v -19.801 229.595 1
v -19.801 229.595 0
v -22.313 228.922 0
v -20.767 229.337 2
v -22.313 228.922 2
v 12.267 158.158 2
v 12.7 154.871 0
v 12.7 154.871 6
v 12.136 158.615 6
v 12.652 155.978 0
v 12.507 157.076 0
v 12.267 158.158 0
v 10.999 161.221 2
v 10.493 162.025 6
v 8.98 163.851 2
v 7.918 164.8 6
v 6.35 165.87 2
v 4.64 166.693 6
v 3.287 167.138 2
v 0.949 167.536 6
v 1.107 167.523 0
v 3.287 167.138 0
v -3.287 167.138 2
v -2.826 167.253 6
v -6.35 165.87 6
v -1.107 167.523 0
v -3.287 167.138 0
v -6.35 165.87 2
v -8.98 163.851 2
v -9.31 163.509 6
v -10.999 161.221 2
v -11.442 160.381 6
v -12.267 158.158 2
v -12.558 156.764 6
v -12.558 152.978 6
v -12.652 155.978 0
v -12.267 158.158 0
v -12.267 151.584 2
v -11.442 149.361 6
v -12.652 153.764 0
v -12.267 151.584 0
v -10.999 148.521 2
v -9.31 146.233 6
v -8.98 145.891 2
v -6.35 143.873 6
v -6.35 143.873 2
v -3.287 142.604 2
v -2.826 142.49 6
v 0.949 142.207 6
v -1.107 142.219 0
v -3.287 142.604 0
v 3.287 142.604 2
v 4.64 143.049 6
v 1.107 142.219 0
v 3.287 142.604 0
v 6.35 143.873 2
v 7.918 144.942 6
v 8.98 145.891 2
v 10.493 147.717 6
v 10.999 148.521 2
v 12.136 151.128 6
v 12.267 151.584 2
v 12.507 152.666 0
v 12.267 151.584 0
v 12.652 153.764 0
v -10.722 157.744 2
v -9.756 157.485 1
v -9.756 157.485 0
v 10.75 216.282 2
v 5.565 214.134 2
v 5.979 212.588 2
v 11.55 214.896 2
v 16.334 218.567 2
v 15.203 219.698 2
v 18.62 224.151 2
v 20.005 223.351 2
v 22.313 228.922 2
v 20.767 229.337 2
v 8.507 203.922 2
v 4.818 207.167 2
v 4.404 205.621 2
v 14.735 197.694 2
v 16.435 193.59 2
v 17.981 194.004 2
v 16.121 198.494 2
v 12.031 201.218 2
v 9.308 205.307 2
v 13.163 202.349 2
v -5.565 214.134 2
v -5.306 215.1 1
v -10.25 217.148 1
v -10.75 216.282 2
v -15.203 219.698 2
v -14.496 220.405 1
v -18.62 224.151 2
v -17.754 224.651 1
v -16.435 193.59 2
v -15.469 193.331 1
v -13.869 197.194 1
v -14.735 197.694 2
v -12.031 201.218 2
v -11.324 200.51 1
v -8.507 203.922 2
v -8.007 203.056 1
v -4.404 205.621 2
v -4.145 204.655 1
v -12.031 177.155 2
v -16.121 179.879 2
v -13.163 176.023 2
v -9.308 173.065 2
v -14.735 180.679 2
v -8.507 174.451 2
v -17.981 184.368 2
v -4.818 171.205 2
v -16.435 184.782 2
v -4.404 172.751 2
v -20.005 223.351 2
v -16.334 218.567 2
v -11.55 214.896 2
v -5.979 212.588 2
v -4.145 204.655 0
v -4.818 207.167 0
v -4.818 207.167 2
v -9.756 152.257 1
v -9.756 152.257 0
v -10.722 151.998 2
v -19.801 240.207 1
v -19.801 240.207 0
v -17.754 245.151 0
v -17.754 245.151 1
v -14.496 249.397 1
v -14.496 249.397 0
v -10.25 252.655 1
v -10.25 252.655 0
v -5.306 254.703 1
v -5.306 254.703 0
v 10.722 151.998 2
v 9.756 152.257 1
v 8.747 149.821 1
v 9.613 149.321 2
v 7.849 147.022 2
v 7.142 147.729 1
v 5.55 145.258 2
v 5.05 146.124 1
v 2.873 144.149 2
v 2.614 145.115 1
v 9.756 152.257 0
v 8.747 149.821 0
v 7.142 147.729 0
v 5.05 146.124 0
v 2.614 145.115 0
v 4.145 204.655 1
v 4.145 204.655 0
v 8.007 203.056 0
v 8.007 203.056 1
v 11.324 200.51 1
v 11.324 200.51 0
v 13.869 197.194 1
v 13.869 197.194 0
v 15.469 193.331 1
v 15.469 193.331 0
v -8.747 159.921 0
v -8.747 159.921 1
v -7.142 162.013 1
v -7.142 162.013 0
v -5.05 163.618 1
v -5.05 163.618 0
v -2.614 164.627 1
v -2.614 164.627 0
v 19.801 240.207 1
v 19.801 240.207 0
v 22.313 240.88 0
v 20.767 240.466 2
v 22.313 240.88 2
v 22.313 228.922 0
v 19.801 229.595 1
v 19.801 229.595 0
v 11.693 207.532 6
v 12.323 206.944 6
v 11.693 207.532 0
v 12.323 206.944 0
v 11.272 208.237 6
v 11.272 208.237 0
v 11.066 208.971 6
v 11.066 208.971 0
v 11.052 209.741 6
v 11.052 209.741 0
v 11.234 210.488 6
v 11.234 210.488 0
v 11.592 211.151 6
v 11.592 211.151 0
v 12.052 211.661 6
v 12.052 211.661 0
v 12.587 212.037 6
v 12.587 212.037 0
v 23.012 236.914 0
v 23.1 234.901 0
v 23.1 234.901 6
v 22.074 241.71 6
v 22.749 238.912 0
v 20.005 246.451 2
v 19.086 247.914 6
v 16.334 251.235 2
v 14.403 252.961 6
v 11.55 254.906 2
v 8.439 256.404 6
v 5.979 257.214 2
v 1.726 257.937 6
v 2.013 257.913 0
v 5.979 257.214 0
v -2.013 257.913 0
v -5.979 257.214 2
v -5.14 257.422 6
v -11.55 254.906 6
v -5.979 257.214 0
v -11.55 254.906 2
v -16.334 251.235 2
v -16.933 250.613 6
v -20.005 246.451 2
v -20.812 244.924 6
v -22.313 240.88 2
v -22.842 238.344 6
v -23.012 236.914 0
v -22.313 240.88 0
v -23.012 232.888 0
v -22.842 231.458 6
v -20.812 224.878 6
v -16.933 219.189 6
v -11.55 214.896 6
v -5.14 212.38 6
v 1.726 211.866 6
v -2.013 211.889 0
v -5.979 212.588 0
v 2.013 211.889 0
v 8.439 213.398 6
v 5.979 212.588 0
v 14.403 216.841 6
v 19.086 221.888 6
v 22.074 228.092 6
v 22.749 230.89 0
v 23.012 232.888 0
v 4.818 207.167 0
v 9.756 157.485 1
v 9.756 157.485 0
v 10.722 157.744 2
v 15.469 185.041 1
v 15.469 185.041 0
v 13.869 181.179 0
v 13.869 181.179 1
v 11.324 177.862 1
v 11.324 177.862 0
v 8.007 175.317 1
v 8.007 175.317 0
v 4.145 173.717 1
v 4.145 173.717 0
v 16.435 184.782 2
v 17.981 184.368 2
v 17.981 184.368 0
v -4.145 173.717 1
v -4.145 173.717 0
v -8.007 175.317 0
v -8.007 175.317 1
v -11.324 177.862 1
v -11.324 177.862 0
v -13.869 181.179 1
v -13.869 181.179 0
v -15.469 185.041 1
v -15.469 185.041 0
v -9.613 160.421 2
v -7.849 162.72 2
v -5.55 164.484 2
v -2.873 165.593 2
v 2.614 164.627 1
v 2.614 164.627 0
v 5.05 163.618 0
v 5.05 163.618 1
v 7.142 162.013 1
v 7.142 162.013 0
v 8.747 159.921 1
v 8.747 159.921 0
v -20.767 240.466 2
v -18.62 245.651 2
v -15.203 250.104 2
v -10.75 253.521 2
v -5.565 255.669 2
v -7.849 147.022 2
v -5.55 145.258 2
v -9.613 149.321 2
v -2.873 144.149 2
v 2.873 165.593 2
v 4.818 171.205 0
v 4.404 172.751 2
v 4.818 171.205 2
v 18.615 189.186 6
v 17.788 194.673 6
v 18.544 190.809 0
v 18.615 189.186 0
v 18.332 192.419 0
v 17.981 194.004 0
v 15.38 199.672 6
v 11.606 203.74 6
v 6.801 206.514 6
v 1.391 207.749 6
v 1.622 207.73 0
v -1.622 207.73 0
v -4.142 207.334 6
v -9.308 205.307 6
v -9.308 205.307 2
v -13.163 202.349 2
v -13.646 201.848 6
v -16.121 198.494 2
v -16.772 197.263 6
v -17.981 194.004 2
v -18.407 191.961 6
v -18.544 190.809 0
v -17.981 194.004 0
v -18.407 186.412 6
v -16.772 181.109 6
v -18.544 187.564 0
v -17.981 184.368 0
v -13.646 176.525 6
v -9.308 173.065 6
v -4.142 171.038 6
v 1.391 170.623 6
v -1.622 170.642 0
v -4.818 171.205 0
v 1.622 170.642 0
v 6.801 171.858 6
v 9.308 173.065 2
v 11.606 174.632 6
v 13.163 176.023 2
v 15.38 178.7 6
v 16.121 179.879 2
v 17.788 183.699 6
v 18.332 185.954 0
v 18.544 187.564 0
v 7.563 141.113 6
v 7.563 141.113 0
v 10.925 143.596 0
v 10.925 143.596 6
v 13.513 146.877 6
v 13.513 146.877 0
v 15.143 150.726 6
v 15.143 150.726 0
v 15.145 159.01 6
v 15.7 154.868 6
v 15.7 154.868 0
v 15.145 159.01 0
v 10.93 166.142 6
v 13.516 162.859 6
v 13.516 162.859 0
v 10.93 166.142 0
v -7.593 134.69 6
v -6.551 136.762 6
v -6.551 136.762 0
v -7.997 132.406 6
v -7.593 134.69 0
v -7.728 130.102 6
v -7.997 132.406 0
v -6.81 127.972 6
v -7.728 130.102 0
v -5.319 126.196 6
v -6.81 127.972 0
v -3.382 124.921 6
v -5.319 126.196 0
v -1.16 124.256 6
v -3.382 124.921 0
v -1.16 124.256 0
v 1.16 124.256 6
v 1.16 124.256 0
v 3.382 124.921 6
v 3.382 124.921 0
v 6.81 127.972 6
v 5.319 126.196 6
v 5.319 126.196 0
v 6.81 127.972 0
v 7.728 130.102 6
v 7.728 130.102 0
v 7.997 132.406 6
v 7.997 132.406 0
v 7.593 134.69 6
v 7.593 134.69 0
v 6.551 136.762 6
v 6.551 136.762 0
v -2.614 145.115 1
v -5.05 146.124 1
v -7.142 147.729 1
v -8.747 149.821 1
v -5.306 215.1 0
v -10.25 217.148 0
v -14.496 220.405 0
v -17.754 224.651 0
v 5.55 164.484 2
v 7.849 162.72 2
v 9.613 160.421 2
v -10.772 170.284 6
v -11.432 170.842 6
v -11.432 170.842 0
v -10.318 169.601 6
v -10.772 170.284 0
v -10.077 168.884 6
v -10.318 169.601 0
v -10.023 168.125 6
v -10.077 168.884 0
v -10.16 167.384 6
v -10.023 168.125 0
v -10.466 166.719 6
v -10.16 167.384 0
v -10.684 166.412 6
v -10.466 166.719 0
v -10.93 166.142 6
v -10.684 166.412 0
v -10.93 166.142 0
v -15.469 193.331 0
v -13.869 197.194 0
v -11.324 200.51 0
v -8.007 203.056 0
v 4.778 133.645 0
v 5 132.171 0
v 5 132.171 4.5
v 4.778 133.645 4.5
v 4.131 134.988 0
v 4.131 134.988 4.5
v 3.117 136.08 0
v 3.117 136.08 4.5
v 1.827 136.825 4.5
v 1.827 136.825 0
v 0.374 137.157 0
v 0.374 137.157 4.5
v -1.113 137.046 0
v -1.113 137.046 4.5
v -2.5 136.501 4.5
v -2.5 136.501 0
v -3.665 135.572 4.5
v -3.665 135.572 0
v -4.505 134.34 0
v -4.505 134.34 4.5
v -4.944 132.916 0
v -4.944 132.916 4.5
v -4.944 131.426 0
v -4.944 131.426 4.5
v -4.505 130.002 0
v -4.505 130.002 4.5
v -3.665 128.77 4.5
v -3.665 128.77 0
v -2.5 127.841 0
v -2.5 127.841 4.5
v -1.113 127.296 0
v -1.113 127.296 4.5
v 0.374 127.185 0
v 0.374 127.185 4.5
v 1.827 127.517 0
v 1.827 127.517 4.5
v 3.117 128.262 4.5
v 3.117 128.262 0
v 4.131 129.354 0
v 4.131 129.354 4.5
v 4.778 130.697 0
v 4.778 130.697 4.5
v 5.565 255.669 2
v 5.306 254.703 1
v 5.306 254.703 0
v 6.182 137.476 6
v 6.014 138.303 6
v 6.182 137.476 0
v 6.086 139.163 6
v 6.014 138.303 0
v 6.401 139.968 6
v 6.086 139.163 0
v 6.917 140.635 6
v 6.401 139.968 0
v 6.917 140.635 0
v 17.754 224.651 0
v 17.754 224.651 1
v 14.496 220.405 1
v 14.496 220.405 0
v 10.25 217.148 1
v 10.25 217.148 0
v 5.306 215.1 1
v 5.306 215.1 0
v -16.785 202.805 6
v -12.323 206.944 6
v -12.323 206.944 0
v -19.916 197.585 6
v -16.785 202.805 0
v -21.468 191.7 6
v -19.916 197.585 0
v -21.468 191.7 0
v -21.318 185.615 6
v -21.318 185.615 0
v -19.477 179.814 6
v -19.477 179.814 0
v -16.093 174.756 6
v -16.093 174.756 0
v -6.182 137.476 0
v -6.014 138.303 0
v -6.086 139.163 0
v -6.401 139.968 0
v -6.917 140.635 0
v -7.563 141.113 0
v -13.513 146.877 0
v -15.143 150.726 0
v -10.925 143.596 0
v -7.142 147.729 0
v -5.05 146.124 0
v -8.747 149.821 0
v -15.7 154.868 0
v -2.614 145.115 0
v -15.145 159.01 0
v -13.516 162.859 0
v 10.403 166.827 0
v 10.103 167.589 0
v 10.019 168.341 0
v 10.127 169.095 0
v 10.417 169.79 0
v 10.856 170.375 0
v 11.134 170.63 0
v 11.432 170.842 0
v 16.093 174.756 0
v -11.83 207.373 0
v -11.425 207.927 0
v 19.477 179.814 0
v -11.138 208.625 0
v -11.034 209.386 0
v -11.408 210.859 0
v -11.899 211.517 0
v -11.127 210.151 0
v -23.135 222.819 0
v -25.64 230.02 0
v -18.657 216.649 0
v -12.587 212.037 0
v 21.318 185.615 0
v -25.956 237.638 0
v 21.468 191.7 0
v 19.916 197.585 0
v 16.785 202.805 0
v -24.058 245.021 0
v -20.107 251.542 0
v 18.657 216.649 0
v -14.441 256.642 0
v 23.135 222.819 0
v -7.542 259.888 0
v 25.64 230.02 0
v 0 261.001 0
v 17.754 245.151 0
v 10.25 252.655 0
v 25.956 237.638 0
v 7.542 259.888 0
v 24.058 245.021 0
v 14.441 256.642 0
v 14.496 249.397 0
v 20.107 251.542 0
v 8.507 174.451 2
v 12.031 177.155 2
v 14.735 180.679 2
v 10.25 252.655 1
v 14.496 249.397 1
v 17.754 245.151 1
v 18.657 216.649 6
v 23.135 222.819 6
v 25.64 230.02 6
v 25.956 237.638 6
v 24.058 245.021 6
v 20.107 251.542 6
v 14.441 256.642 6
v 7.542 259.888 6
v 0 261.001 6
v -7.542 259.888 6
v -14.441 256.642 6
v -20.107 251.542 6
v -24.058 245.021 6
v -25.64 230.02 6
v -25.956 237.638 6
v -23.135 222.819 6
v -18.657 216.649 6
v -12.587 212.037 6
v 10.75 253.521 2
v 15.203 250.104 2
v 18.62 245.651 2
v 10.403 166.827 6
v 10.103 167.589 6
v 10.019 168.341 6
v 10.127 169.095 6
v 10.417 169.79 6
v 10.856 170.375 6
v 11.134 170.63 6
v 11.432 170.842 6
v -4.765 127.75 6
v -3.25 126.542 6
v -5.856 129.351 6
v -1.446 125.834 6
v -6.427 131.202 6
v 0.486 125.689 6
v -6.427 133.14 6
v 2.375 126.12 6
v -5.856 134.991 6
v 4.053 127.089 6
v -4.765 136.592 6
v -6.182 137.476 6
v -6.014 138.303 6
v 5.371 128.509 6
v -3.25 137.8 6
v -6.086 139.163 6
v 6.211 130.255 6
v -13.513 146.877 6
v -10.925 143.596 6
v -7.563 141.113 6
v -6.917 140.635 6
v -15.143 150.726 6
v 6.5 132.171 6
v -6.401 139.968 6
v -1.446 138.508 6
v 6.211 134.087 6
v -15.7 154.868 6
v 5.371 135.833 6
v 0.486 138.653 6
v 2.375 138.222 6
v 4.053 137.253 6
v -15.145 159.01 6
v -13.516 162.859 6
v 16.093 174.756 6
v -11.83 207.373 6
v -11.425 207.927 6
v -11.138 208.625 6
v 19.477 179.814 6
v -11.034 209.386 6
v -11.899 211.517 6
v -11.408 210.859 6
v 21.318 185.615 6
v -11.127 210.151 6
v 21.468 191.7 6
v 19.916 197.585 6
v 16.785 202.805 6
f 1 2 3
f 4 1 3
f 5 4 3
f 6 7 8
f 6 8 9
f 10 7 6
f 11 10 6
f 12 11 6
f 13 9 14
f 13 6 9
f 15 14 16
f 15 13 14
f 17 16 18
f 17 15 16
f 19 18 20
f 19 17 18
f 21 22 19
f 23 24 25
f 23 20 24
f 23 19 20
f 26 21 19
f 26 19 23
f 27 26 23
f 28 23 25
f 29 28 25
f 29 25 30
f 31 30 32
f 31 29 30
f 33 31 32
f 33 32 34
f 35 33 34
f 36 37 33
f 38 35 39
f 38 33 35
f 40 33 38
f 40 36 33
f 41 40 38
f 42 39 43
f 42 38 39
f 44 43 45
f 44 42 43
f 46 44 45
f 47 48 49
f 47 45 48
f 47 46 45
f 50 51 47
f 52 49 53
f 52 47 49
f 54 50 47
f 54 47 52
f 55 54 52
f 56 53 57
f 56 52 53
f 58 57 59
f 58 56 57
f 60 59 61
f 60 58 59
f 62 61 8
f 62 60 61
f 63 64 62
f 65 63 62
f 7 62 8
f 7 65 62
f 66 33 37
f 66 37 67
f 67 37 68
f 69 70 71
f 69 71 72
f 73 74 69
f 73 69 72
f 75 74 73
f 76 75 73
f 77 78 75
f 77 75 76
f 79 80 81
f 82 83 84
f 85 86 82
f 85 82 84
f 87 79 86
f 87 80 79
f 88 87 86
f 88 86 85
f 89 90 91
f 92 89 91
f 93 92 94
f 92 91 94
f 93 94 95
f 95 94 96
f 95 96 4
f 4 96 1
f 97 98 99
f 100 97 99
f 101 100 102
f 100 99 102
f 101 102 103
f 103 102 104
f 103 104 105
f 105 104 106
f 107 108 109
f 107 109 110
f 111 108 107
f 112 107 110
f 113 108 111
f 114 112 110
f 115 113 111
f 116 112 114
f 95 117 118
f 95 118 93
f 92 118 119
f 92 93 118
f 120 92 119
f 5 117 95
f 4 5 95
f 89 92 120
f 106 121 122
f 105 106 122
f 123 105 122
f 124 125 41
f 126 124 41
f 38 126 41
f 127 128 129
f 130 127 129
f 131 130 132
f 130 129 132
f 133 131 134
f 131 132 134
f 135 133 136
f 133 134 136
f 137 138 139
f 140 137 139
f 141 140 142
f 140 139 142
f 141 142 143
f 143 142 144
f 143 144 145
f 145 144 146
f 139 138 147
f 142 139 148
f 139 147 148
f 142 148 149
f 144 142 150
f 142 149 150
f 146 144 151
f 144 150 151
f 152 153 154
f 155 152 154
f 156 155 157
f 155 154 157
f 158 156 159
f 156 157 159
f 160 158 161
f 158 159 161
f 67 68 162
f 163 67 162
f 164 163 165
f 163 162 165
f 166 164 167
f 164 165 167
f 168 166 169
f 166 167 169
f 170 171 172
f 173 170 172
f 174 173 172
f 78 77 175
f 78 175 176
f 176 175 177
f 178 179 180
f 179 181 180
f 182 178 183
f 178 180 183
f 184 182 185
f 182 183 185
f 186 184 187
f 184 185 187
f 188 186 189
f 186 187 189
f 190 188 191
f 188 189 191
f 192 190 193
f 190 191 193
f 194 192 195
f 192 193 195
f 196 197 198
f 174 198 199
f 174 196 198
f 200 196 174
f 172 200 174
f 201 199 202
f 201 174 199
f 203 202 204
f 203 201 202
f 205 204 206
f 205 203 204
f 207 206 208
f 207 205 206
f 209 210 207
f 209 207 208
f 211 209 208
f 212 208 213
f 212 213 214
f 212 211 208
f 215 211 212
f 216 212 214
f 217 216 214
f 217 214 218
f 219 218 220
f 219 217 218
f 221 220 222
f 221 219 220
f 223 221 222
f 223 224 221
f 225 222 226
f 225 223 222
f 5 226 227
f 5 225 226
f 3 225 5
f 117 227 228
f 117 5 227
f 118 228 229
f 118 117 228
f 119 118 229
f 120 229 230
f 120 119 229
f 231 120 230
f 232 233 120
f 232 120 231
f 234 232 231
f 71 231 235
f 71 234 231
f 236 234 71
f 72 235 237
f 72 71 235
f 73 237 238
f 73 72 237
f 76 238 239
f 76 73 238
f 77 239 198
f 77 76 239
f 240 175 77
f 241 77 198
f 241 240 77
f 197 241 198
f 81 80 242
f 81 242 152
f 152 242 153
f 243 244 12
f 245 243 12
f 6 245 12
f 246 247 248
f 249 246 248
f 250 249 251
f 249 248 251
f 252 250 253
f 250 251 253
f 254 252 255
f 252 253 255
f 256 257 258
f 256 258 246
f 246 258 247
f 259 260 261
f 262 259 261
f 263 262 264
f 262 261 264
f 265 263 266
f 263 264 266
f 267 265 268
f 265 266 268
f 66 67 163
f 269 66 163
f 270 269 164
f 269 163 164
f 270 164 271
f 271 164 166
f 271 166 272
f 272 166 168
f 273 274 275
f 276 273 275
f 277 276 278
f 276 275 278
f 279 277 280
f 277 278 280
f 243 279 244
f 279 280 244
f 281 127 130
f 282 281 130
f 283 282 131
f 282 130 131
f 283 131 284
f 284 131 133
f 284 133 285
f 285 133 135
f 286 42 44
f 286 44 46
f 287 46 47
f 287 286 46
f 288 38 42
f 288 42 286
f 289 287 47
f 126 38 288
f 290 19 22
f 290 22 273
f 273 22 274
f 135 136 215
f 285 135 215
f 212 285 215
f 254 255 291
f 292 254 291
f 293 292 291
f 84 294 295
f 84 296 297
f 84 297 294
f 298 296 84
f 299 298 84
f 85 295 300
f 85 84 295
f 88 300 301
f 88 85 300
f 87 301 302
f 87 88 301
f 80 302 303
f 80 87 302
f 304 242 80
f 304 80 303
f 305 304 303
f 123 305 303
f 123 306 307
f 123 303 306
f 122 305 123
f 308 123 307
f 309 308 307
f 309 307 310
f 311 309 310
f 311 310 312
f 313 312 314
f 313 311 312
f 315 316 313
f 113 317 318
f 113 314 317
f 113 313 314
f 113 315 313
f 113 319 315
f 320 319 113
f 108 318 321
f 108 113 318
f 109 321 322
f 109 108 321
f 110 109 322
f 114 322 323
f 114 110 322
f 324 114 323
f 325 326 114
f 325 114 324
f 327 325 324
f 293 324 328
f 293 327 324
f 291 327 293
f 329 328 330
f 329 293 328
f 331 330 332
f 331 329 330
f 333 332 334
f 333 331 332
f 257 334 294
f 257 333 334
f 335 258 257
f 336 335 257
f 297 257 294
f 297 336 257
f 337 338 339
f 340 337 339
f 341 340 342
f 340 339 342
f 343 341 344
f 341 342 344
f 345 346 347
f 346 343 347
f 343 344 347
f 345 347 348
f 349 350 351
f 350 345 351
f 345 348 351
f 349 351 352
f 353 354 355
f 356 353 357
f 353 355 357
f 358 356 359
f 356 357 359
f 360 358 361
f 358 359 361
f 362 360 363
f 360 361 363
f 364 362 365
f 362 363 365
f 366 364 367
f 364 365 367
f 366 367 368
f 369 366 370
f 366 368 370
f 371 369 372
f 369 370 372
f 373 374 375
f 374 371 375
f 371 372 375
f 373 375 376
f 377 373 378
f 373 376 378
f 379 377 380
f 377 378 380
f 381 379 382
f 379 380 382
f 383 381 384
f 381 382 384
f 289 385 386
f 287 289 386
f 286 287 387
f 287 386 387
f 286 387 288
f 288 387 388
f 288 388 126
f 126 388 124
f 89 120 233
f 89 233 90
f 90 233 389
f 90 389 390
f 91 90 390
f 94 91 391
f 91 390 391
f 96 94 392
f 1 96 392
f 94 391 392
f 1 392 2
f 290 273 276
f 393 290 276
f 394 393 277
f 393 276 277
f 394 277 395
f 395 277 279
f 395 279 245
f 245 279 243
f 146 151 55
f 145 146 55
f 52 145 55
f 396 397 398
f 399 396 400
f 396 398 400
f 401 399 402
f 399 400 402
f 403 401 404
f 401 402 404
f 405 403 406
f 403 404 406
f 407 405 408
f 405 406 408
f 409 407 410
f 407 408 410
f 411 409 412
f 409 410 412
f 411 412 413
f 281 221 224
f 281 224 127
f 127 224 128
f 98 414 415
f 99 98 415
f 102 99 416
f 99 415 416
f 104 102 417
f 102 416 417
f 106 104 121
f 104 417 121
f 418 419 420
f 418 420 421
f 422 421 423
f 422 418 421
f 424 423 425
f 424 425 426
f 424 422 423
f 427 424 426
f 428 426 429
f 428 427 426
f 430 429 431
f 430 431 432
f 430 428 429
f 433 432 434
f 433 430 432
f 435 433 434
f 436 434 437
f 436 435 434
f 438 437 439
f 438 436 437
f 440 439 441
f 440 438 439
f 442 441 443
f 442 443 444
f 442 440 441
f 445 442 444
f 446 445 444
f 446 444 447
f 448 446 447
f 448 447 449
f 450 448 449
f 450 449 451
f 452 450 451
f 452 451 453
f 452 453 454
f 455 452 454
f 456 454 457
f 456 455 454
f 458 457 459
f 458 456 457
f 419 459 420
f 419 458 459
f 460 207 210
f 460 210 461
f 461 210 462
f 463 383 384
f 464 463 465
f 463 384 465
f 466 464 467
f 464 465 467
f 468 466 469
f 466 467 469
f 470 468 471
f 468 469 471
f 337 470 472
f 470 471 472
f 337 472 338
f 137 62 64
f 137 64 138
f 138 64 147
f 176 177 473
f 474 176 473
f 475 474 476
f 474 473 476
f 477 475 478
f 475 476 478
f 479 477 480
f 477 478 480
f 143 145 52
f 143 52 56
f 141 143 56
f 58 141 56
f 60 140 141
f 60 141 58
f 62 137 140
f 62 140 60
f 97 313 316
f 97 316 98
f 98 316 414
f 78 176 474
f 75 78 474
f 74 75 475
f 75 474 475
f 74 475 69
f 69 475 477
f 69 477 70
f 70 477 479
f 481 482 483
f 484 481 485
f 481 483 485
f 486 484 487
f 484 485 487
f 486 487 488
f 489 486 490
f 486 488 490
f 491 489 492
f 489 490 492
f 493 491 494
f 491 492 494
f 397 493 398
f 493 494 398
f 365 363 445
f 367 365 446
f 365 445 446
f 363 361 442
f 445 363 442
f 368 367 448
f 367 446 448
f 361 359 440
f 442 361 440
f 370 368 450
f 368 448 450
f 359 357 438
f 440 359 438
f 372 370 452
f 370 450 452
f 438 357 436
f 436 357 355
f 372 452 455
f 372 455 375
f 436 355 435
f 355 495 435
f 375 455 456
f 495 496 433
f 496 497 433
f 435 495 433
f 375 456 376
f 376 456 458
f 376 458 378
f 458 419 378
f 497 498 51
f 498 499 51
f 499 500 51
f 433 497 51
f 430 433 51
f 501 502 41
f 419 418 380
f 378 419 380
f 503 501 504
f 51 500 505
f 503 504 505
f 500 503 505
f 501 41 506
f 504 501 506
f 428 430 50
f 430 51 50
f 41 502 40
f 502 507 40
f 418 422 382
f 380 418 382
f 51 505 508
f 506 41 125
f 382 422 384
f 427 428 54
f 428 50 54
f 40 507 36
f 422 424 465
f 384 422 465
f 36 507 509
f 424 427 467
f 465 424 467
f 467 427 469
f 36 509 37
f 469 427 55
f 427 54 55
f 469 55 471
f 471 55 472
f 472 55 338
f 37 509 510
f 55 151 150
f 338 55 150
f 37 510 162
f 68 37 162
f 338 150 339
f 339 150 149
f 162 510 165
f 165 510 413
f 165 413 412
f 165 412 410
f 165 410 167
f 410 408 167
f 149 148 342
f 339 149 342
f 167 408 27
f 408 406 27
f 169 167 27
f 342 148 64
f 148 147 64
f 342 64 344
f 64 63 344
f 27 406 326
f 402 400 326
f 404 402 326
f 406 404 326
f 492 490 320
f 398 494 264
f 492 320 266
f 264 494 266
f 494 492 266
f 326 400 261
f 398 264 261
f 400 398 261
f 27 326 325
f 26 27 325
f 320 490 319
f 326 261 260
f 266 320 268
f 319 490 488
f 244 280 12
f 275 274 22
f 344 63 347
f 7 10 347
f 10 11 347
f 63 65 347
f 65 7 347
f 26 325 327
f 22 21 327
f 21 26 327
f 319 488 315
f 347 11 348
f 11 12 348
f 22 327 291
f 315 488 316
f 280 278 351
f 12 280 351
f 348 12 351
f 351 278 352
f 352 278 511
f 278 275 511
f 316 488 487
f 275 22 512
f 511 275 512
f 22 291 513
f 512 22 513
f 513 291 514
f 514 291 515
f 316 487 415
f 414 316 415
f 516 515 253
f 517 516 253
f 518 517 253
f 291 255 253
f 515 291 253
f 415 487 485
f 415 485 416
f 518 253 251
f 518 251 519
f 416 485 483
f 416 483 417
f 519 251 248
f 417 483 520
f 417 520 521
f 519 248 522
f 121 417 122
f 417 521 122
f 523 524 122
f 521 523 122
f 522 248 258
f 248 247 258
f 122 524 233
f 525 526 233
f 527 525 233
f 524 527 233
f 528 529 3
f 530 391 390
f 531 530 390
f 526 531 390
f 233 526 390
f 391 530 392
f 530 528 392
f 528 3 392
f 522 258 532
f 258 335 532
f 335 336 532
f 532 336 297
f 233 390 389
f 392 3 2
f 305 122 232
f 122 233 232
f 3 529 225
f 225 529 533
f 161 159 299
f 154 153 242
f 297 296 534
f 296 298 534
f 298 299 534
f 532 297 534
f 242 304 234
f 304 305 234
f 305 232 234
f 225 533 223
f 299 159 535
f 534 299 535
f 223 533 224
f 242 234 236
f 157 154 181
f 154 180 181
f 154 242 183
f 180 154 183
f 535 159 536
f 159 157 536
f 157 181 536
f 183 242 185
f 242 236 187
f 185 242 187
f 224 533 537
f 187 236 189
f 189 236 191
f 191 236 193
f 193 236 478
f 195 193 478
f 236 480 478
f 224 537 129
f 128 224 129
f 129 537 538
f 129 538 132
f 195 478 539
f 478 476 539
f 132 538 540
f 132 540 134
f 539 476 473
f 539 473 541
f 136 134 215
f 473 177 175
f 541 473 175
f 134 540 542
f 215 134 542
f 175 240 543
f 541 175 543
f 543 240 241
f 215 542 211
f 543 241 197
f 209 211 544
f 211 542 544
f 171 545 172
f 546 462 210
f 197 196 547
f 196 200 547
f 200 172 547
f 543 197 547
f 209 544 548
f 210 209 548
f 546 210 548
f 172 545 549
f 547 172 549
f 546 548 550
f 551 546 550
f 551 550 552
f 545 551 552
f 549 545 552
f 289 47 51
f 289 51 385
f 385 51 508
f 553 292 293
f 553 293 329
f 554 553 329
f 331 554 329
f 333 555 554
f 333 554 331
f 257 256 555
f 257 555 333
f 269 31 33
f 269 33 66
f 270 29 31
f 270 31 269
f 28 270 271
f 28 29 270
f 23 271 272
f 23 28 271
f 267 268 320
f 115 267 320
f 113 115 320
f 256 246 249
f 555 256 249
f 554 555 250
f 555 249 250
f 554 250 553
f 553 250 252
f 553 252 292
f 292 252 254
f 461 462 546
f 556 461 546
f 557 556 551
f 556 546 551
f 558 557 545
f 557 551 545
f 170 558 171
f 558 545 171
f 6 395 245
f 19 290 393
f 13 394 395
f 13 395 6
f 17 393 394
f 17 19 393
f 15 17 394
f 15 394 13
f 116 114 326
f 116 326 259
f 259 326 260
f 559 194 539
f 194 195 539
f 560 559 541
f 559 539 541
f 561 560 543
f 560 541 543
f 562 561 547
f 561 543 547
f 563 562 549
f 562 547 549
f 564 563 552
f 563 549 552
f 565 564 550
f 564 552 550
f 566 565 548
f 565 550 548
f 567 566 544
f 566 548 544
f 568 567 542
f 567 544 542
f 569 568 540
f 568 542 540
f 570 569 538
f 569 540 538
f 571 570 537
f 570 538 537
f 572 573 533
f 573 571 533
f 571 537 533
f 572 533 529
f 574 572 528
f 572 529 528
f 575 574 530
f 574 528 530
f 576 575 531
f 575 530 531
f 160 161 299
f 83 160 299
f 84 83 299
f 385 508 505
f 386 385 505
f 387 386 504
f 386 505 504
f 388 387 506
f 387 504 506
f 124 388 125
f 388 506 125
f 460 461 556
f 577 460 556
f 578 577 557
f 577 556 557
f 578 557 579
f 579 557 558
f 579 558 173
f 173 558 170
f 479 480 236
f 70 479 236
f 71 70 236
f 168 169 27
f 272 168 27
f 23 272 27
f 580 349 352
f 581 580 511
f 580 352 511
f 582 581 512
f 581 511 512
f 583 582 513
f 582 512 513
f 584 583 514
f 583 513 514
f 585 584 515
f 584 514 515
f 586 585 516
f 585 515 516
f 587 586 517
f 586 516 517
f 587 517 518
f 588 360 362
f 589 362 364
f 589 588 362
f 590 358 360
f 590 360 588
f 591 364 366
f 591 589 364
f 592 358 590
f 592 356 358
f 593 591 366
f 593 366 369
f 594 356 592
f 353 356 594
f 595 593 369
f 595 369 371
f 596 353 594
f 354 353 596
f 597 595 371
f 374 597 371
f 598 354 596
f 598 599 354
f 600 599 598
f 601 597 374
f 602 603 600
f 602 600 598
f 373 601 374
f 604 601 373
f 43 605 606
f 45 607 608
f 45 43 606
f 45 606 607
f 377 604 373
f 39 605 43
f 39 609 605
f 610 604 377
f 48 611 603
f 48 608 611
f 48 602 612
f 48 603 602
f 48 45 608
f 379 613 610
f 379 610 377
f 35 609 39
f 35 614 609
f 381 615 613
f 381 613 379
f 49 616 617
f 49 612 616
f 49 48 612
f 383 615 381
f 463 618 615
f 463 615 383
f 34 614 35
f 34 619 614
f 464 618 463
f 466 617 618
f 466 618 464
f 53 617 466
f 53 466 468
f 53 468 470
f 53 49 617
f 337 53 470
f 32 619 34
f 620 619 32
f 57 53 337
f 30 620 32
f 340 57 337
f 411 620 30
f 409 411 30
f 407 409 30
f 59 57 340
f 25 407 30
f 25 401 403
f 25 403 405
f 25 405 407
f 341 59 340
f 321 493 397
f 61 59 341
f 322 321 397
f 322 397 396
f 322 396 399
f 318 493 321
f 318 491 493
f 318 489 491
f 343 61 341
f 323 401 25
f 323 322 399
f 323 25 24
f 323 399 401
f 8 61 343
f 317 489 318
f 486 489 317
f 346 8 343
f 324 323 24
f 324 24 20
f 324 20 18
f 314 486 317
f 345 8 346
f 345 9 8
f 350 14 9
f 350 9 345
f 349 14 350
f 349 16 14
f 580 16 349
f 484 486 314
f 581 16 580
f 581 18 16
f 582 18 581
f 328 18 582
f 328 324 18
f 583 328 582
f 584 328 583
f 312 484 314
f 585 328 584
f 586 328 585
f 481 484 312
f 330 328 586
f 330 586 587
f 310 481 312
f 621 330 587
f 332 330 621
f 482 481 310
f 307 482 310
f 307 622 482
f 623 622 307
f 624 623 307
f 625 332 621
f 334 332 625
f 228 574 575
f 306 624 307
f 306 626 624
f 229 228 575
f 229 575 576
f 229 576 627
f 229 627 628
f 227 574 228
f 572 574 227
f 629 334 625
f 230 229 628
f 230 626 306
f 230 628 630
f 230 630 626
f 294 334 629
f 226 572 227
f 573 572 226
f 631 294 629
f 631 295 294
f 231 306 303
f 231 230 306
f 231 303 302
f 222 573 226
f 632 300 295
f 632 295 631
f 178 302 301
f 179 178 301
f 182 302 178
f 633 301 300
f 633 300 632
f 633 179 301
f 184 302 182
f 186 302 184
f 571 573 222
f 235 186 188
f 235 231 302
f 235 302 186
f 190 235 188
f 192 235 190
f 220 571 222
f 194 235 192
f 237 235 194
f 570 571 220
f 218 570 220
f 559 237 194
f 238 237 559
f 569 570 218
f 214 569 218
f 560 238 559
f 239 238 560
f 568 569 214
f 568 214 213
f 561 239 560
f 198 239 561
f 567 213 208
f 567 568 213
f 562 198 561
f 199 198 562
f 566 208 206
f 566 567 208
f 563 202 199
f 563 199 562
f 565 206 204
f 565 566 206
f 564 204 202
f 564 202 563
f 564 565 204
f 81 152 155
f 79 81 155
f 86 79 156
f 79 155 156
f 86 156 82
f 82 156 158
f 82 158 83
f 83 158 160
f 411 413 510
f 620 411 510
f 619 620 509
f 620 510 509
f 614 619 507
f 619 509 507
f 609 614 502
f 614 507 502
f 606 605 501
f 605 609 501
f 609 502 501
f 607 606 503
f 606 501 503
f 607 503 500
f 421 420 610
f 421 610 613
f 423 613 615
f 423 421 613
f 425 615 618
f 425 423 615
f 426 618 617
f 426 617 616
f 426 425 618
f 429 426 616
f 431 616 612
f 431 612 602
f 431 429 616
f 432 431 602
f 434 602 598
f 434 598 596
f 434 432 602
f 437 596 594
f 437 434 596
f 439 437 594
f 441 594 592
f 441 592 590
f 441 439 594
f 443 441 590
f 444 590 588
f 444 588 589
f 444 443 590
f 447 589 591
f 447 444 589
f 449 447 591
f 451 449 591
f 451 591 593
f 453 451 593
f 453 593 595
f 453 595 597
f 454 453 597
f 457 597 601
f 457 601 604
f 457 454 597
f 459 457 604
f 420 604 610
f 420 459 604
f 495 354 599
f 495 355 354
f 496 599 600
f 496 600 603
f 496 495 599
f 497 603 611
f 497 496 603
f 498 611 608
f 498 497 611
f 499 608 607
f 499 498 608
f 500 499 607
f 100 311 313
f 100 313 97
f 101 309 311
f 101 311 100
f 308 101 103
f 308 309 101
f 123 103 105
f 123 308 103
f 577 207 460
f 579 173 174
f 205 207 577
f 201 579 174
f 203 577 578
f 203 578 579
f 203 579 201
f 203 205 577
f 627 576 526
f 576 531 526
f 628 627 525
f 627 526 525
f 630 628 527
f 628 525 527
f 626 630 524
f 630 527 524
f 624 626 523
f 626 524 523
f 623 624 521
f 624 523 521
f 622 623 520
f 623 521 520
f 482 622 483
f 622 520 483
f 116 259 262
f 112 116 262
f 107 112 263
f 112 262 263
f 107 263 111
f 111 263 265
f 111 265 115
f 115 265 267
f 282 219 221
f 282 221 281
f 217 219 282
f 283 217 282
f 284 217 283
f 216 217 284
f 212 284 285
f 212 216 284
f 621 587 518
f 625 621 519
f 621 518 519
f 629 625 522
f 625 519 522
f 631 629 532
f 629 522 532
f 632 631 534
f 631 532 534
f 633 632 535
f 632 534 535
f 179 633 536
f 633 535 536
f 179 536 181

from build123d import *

# Parameters (mm, degrees)
F0_R      = 26.1
F0_R_2    = 23.1
F1_DEPTH  = 6
F3_DEPTH  = 2
F4_SIZE   = 1
F5_R      = 21.615
F5_R_2    = 18.615
F6_DEPTH  = 6
F8_DEPTH  = 2
F9_SIZE   = 1
F10_R     = 15.7
F10_R_2   = 12.7
F11_DEPTH = 6
F13_DEPTH = 2
F14_SIZE  = 1
F15_R     = 8
F15_R_2   = 5
F16_DEPTH = 6
F17_SIZE  = 1.5
F18_R     = 3


with BuildPart() as f1:
    # F0 (on Top) → F1 (new body)
    with BuildSketch(Plane.XY):
        with Locations((0, 234.9011148272)):
            Circle(F0_R)
        with Locations((0, 234.9011148272)):
            Circle(F0_R_2, mode=Mode.SUBTRACT)
    extrude(amount=F1_DEPTH)

    # F2 (on Top) → F3 (join)
    with BuildSketch(Plane.XY):
        with BuildLine():
            ThreePointArc((-19.8014794389, 240.2069052518), (-14.4956890143, 249.3968038415), (-5.3057904246, 254.7025942661))
            Line((-5.3057904246, 254.7025942661), (-5.9787199419, 257.2140014145))
            ThreePointArc((-5.9787199419, 257.2140014145), (-16.3341666454, 251.2352814726), (-22.3128865873, 240.8798347691))
            Line((-22.3128865873, 240.8798347691), (-19.8014794389, 240.2069052518))
        make_face()
        with BuildLine():
            ThreePointArc((5.3057904246, 254.7025942661), (14.4956890143, 249.3968038415), (19.8014794389, 240.2069052518))
            Line((19.8014794389, 240.2069052518), (22.3128865873, 240.8798347691))
            ThreePointArc((22.3128865873, 240.8798347691), (16.3341666454, 251.2352814726), (5.9787199419, 257.2140014145))
            Line((5.9787199419, 257.2140014145), (5.3057904246, 254.7025942661))
        make_face()
        with BuildLine():
            Line((22.3128865873, 228.9223948853), (19.8014794389, 229.5953244026))
            ThreePointArc((19.8014794389, 229.5953244026), (14.4956890143, 220.4054258129), (5.3057904246, 215.0996353883))
            Line((5.3057904246, 215.0996353883), (5.9787199419, 212.5882282399))
            ThreePointArc((5.9787199419, 212.5882282399), (16.3341666454, 218.5669481818), (22.3128865873, 228.9223948853))
        make_face()
        with BuildLine():
            Line((-5.9787199419, 212.5882282399), (-5.3057904246, 215.0996353883))
            ThreePointArc((-5.3057904246, 215.0996353883), (-14.4956890143, 220.4054258129), (-19.8014794389, 229.5953244026))
            Line((-19.8014794389, 229.5953244026), (-22.3128865873, 228.9223948853))
            ThreePointArc((-22.3128865873, 228.9223948853), (-16.3341666454, 218.5669481818), (-5.9787199419, 212.5882282399))
        make_face()
    extrude(amount=F3_DEPTH)

    # F4
    f4_edges = [f1.edges().sort_by_distance(p)[0] for p in [
        (-14.495689, 249.396804, 2),
        (14.495689, 249.396804, 2),
        (14.495689, 220.405426, 2),
        (-14.495689, 220.405426, 2),
    ]]
    chamfer(f4_edges, length=F4_SIZE)

    # F5 (on Top) → F6 (join)
    with BuildSketch(Plane.XY):
        with Locations((0, 189.1861148272)):
            Circle(F5_R)
        with Locations((0, 189.1861148272)):
            Circle(F5_R_2, mode=Mode.SUBTRACT)
    extrude(amount=F6_DEPTH)

    # F7 (on Top) → F8 (join)
    with BuildSketch(Plane.XY):
        with BuildLine():
            ThreePointArc((-15.469302108, 193.3311018345), (-11.3243151007, 200.5104299279), (-4.1449870073, 204.6554169352))
            Line((-4.1449870073, 204.6554169352), (-4.8179165246, 207.1668240836))
            ThreePointArc((-4.8179165246, 207.1668240836), (-13.1627927318, 202.348907559), (-17.9807092564, 194.0040313518))
            Line((-17.9807092564, 194.0040313518), (-15.469302108, 193.3311018345))
        make_face()
        with BuildLine():
            Line((4.8179165246, 207.1668240836), (4.1449870073, 204.6554169352))
            ThreePointArc((4.1449870073, 204.6554169352), (11.3243151007, 200.5104299279), (15.469302108, 193.3311018345))
            Line((15.469302108, 193.3311018345), (17.9807092564, 194.0040313518))
            ThreePointArc((17.9807092564, 194.0040313518), (13.1627927318, 202.348907559), (4.8179165246, 207.1668240836))
        make_face()
        with BuildLine():
            Line((17.9807092564, 184.3681983026), (15.469302108, 185.0411278199))
            ThreePointArc((15.469302108, 185.0411278199), (11.3243151007, 177.8617997265), (4.1449870073, 173.7168127192))
            Line((4.1449870073, 173.7168127192), (4.8179165246, 171.2054055708))
            ThreePointArc((4.8179165246, 171.2054055708), (13.1627927318, 176.0233220954), (17.9807092564, 184.3681983026))
        make_face()
        with BuildLine():
            Line((-4.8179165246, 171.2054055708), (-4.1449870073, 173.7168127192))
            ThreePointArc((-4.1449870073, 173.7168127192), (-11.3243151007, 177.8617997265), (-15.469302108, 185.0411278199))
            Line((-15.469302108, 185.0411278199), (-17.9807092564, 184.3681983026))
            ThreePointArc((-17.9807092564, 184.3681983026), (-13.1627927318, 176.0233220954), (-4.8179165246, 171.2054055708))
        make_face()
    extrude(amount=F8_DEPTH)

    # F9
    f9_edges = [f1.edges().sort_by_distance(p)[0] for p in [
        (-11.324315, 200.51043, 2),
        (11.324315, 200.51043, 2),
        (11.324315, 177.8618, 2),
        (-11.324315, 177.8618, 2),
    ]]
    chamfer(f9_edges, length=F9_SIZE)

    # F10 (on Top) → F11 (join)
    with BuildSketch(Plane.XY):
        with Locations((0, 154.8711148272)):
            Circle(F10_R)
        with Locations((0, 154.8711148272)):
            Circle(F10_R_2, mode=Mode.SUBTRACT)
    extrude(amount=F11_DEPTH)

    # F12 (on Top) → F13 (join)
    with BuildSketch(Plane.XY):
        with BuildLine():
            Line((-2.6140723555, 164.6269656727), (-3.2870018728, 167.1383728211))
            ThreePointArc((-3.2870018728, 167.1383728211), (-8.9802561211, 163.8513709483), (-12.2672579939, 158.1581167))
            Line((-12.2672579939, 158.1581167), (-9.7558508455, 157.4851871827))
            ThreePointArc((-9.7558508455, 157.4851871827), (-7.14177849, 162.0128933172), (-2.6140723555, 164.6269656727))
        make_face()
        with BuildLine():
            Line((3.2870018728, 167.1383728211), (2.6140723555, 164.6269656727))
            ThreePointArc((2.6140723555, 164.6269656727), (7.14177849, 162.0128933172), (9.7558508455, 157.4851871827))
            Line((9.7558508455, 157.4851871827), (12.2672579939, 158.1581167))
            ThreePointArc((12.2672579939, 158.1581167), (8.9802561211, 163.8513709483), (3.2870018728, 167.1383728211))
        make_face()
        with BuildLine():
            Line((12.2672579939, 151.5841129544), (9.7558508455, 152.2570424717))
            ThreePointArc((9.7558508455, 152.2570424717), (7.14177849, 147.7293363372), (2.6140723555, 145.1152639817))
            Line((2.6140723555, 145.1152639817), (3.2870018728, 142.6038568333))
            ThreePointArc((3.2870018728, 142.6038568333), (8.9802561211, 145.8908587061), (12.2672579939, 151.5841129544))
        make_face()
        with BuildLine():
            Line((-3.2870018728, 142.6038568333), (-2.6140723555, 145.1152639817))
            ThreePointArc((-2.6140723555, 145.1152639817), (-7.14177849, 147.7293363372), (-9.7558508455, 152.2570424717))
            Line((-9.7558508455, 152.2570424717), (-12.2672579939, 151.5841129544))
            ThreePointArc((-12.2672579939, 151.5841129544), (-8.9802561211, 145.8908587061), (-3.2870018728, 142.6038568333))
        make_face()
    extrude(amount=F13_DEPTH)

    # F14
    f14_edges = [f1.edges().sort_by_distance(p)[0] for p in [
        (-7.141778, 162.012893, 2),
        (7.141778, 162.012893, 2),
        (7.141778, 147.729336, 2),
        (-7.141778, 147.729336, 2),
    ]]
    chamfer(f14_edges, length=F14_SIZE)

    # F15 (on Top) → F16 (join)
    with BuildSketch(Plane.XY):
        with Locations((0, 132.1710638065)):
            Circle(F15_R)
        with Locations((0, 132.1710638065)):
            Circle(F15_R_2, mode=Mode.SUBTRACT)
    extrude(amount=F16_DEPTH)

    # F17
    f17_edges = [f1.edges().sort_by_distance(p)[0] for p in [
        (-5, 132.171064, 6),
    ]]
    chamfer(f17_edges, length=F17_SIZE)

    # F18
    f18_edges = [f1.edges().sort_by_distance(p)[0] for p in [
        (-6.801865, 209.703007, 3),
        (6.801865, 209.703007, 3),
        (7.219852, 168.812554, 3),
        (-7.219852, 168.812554, 3),
        (3.20387, 139.501495, 3),
        (-3.20387, 139.501495, 3),
    ]]
    fillet(f18_edges, radius=F18_R)


solid = f1.part
